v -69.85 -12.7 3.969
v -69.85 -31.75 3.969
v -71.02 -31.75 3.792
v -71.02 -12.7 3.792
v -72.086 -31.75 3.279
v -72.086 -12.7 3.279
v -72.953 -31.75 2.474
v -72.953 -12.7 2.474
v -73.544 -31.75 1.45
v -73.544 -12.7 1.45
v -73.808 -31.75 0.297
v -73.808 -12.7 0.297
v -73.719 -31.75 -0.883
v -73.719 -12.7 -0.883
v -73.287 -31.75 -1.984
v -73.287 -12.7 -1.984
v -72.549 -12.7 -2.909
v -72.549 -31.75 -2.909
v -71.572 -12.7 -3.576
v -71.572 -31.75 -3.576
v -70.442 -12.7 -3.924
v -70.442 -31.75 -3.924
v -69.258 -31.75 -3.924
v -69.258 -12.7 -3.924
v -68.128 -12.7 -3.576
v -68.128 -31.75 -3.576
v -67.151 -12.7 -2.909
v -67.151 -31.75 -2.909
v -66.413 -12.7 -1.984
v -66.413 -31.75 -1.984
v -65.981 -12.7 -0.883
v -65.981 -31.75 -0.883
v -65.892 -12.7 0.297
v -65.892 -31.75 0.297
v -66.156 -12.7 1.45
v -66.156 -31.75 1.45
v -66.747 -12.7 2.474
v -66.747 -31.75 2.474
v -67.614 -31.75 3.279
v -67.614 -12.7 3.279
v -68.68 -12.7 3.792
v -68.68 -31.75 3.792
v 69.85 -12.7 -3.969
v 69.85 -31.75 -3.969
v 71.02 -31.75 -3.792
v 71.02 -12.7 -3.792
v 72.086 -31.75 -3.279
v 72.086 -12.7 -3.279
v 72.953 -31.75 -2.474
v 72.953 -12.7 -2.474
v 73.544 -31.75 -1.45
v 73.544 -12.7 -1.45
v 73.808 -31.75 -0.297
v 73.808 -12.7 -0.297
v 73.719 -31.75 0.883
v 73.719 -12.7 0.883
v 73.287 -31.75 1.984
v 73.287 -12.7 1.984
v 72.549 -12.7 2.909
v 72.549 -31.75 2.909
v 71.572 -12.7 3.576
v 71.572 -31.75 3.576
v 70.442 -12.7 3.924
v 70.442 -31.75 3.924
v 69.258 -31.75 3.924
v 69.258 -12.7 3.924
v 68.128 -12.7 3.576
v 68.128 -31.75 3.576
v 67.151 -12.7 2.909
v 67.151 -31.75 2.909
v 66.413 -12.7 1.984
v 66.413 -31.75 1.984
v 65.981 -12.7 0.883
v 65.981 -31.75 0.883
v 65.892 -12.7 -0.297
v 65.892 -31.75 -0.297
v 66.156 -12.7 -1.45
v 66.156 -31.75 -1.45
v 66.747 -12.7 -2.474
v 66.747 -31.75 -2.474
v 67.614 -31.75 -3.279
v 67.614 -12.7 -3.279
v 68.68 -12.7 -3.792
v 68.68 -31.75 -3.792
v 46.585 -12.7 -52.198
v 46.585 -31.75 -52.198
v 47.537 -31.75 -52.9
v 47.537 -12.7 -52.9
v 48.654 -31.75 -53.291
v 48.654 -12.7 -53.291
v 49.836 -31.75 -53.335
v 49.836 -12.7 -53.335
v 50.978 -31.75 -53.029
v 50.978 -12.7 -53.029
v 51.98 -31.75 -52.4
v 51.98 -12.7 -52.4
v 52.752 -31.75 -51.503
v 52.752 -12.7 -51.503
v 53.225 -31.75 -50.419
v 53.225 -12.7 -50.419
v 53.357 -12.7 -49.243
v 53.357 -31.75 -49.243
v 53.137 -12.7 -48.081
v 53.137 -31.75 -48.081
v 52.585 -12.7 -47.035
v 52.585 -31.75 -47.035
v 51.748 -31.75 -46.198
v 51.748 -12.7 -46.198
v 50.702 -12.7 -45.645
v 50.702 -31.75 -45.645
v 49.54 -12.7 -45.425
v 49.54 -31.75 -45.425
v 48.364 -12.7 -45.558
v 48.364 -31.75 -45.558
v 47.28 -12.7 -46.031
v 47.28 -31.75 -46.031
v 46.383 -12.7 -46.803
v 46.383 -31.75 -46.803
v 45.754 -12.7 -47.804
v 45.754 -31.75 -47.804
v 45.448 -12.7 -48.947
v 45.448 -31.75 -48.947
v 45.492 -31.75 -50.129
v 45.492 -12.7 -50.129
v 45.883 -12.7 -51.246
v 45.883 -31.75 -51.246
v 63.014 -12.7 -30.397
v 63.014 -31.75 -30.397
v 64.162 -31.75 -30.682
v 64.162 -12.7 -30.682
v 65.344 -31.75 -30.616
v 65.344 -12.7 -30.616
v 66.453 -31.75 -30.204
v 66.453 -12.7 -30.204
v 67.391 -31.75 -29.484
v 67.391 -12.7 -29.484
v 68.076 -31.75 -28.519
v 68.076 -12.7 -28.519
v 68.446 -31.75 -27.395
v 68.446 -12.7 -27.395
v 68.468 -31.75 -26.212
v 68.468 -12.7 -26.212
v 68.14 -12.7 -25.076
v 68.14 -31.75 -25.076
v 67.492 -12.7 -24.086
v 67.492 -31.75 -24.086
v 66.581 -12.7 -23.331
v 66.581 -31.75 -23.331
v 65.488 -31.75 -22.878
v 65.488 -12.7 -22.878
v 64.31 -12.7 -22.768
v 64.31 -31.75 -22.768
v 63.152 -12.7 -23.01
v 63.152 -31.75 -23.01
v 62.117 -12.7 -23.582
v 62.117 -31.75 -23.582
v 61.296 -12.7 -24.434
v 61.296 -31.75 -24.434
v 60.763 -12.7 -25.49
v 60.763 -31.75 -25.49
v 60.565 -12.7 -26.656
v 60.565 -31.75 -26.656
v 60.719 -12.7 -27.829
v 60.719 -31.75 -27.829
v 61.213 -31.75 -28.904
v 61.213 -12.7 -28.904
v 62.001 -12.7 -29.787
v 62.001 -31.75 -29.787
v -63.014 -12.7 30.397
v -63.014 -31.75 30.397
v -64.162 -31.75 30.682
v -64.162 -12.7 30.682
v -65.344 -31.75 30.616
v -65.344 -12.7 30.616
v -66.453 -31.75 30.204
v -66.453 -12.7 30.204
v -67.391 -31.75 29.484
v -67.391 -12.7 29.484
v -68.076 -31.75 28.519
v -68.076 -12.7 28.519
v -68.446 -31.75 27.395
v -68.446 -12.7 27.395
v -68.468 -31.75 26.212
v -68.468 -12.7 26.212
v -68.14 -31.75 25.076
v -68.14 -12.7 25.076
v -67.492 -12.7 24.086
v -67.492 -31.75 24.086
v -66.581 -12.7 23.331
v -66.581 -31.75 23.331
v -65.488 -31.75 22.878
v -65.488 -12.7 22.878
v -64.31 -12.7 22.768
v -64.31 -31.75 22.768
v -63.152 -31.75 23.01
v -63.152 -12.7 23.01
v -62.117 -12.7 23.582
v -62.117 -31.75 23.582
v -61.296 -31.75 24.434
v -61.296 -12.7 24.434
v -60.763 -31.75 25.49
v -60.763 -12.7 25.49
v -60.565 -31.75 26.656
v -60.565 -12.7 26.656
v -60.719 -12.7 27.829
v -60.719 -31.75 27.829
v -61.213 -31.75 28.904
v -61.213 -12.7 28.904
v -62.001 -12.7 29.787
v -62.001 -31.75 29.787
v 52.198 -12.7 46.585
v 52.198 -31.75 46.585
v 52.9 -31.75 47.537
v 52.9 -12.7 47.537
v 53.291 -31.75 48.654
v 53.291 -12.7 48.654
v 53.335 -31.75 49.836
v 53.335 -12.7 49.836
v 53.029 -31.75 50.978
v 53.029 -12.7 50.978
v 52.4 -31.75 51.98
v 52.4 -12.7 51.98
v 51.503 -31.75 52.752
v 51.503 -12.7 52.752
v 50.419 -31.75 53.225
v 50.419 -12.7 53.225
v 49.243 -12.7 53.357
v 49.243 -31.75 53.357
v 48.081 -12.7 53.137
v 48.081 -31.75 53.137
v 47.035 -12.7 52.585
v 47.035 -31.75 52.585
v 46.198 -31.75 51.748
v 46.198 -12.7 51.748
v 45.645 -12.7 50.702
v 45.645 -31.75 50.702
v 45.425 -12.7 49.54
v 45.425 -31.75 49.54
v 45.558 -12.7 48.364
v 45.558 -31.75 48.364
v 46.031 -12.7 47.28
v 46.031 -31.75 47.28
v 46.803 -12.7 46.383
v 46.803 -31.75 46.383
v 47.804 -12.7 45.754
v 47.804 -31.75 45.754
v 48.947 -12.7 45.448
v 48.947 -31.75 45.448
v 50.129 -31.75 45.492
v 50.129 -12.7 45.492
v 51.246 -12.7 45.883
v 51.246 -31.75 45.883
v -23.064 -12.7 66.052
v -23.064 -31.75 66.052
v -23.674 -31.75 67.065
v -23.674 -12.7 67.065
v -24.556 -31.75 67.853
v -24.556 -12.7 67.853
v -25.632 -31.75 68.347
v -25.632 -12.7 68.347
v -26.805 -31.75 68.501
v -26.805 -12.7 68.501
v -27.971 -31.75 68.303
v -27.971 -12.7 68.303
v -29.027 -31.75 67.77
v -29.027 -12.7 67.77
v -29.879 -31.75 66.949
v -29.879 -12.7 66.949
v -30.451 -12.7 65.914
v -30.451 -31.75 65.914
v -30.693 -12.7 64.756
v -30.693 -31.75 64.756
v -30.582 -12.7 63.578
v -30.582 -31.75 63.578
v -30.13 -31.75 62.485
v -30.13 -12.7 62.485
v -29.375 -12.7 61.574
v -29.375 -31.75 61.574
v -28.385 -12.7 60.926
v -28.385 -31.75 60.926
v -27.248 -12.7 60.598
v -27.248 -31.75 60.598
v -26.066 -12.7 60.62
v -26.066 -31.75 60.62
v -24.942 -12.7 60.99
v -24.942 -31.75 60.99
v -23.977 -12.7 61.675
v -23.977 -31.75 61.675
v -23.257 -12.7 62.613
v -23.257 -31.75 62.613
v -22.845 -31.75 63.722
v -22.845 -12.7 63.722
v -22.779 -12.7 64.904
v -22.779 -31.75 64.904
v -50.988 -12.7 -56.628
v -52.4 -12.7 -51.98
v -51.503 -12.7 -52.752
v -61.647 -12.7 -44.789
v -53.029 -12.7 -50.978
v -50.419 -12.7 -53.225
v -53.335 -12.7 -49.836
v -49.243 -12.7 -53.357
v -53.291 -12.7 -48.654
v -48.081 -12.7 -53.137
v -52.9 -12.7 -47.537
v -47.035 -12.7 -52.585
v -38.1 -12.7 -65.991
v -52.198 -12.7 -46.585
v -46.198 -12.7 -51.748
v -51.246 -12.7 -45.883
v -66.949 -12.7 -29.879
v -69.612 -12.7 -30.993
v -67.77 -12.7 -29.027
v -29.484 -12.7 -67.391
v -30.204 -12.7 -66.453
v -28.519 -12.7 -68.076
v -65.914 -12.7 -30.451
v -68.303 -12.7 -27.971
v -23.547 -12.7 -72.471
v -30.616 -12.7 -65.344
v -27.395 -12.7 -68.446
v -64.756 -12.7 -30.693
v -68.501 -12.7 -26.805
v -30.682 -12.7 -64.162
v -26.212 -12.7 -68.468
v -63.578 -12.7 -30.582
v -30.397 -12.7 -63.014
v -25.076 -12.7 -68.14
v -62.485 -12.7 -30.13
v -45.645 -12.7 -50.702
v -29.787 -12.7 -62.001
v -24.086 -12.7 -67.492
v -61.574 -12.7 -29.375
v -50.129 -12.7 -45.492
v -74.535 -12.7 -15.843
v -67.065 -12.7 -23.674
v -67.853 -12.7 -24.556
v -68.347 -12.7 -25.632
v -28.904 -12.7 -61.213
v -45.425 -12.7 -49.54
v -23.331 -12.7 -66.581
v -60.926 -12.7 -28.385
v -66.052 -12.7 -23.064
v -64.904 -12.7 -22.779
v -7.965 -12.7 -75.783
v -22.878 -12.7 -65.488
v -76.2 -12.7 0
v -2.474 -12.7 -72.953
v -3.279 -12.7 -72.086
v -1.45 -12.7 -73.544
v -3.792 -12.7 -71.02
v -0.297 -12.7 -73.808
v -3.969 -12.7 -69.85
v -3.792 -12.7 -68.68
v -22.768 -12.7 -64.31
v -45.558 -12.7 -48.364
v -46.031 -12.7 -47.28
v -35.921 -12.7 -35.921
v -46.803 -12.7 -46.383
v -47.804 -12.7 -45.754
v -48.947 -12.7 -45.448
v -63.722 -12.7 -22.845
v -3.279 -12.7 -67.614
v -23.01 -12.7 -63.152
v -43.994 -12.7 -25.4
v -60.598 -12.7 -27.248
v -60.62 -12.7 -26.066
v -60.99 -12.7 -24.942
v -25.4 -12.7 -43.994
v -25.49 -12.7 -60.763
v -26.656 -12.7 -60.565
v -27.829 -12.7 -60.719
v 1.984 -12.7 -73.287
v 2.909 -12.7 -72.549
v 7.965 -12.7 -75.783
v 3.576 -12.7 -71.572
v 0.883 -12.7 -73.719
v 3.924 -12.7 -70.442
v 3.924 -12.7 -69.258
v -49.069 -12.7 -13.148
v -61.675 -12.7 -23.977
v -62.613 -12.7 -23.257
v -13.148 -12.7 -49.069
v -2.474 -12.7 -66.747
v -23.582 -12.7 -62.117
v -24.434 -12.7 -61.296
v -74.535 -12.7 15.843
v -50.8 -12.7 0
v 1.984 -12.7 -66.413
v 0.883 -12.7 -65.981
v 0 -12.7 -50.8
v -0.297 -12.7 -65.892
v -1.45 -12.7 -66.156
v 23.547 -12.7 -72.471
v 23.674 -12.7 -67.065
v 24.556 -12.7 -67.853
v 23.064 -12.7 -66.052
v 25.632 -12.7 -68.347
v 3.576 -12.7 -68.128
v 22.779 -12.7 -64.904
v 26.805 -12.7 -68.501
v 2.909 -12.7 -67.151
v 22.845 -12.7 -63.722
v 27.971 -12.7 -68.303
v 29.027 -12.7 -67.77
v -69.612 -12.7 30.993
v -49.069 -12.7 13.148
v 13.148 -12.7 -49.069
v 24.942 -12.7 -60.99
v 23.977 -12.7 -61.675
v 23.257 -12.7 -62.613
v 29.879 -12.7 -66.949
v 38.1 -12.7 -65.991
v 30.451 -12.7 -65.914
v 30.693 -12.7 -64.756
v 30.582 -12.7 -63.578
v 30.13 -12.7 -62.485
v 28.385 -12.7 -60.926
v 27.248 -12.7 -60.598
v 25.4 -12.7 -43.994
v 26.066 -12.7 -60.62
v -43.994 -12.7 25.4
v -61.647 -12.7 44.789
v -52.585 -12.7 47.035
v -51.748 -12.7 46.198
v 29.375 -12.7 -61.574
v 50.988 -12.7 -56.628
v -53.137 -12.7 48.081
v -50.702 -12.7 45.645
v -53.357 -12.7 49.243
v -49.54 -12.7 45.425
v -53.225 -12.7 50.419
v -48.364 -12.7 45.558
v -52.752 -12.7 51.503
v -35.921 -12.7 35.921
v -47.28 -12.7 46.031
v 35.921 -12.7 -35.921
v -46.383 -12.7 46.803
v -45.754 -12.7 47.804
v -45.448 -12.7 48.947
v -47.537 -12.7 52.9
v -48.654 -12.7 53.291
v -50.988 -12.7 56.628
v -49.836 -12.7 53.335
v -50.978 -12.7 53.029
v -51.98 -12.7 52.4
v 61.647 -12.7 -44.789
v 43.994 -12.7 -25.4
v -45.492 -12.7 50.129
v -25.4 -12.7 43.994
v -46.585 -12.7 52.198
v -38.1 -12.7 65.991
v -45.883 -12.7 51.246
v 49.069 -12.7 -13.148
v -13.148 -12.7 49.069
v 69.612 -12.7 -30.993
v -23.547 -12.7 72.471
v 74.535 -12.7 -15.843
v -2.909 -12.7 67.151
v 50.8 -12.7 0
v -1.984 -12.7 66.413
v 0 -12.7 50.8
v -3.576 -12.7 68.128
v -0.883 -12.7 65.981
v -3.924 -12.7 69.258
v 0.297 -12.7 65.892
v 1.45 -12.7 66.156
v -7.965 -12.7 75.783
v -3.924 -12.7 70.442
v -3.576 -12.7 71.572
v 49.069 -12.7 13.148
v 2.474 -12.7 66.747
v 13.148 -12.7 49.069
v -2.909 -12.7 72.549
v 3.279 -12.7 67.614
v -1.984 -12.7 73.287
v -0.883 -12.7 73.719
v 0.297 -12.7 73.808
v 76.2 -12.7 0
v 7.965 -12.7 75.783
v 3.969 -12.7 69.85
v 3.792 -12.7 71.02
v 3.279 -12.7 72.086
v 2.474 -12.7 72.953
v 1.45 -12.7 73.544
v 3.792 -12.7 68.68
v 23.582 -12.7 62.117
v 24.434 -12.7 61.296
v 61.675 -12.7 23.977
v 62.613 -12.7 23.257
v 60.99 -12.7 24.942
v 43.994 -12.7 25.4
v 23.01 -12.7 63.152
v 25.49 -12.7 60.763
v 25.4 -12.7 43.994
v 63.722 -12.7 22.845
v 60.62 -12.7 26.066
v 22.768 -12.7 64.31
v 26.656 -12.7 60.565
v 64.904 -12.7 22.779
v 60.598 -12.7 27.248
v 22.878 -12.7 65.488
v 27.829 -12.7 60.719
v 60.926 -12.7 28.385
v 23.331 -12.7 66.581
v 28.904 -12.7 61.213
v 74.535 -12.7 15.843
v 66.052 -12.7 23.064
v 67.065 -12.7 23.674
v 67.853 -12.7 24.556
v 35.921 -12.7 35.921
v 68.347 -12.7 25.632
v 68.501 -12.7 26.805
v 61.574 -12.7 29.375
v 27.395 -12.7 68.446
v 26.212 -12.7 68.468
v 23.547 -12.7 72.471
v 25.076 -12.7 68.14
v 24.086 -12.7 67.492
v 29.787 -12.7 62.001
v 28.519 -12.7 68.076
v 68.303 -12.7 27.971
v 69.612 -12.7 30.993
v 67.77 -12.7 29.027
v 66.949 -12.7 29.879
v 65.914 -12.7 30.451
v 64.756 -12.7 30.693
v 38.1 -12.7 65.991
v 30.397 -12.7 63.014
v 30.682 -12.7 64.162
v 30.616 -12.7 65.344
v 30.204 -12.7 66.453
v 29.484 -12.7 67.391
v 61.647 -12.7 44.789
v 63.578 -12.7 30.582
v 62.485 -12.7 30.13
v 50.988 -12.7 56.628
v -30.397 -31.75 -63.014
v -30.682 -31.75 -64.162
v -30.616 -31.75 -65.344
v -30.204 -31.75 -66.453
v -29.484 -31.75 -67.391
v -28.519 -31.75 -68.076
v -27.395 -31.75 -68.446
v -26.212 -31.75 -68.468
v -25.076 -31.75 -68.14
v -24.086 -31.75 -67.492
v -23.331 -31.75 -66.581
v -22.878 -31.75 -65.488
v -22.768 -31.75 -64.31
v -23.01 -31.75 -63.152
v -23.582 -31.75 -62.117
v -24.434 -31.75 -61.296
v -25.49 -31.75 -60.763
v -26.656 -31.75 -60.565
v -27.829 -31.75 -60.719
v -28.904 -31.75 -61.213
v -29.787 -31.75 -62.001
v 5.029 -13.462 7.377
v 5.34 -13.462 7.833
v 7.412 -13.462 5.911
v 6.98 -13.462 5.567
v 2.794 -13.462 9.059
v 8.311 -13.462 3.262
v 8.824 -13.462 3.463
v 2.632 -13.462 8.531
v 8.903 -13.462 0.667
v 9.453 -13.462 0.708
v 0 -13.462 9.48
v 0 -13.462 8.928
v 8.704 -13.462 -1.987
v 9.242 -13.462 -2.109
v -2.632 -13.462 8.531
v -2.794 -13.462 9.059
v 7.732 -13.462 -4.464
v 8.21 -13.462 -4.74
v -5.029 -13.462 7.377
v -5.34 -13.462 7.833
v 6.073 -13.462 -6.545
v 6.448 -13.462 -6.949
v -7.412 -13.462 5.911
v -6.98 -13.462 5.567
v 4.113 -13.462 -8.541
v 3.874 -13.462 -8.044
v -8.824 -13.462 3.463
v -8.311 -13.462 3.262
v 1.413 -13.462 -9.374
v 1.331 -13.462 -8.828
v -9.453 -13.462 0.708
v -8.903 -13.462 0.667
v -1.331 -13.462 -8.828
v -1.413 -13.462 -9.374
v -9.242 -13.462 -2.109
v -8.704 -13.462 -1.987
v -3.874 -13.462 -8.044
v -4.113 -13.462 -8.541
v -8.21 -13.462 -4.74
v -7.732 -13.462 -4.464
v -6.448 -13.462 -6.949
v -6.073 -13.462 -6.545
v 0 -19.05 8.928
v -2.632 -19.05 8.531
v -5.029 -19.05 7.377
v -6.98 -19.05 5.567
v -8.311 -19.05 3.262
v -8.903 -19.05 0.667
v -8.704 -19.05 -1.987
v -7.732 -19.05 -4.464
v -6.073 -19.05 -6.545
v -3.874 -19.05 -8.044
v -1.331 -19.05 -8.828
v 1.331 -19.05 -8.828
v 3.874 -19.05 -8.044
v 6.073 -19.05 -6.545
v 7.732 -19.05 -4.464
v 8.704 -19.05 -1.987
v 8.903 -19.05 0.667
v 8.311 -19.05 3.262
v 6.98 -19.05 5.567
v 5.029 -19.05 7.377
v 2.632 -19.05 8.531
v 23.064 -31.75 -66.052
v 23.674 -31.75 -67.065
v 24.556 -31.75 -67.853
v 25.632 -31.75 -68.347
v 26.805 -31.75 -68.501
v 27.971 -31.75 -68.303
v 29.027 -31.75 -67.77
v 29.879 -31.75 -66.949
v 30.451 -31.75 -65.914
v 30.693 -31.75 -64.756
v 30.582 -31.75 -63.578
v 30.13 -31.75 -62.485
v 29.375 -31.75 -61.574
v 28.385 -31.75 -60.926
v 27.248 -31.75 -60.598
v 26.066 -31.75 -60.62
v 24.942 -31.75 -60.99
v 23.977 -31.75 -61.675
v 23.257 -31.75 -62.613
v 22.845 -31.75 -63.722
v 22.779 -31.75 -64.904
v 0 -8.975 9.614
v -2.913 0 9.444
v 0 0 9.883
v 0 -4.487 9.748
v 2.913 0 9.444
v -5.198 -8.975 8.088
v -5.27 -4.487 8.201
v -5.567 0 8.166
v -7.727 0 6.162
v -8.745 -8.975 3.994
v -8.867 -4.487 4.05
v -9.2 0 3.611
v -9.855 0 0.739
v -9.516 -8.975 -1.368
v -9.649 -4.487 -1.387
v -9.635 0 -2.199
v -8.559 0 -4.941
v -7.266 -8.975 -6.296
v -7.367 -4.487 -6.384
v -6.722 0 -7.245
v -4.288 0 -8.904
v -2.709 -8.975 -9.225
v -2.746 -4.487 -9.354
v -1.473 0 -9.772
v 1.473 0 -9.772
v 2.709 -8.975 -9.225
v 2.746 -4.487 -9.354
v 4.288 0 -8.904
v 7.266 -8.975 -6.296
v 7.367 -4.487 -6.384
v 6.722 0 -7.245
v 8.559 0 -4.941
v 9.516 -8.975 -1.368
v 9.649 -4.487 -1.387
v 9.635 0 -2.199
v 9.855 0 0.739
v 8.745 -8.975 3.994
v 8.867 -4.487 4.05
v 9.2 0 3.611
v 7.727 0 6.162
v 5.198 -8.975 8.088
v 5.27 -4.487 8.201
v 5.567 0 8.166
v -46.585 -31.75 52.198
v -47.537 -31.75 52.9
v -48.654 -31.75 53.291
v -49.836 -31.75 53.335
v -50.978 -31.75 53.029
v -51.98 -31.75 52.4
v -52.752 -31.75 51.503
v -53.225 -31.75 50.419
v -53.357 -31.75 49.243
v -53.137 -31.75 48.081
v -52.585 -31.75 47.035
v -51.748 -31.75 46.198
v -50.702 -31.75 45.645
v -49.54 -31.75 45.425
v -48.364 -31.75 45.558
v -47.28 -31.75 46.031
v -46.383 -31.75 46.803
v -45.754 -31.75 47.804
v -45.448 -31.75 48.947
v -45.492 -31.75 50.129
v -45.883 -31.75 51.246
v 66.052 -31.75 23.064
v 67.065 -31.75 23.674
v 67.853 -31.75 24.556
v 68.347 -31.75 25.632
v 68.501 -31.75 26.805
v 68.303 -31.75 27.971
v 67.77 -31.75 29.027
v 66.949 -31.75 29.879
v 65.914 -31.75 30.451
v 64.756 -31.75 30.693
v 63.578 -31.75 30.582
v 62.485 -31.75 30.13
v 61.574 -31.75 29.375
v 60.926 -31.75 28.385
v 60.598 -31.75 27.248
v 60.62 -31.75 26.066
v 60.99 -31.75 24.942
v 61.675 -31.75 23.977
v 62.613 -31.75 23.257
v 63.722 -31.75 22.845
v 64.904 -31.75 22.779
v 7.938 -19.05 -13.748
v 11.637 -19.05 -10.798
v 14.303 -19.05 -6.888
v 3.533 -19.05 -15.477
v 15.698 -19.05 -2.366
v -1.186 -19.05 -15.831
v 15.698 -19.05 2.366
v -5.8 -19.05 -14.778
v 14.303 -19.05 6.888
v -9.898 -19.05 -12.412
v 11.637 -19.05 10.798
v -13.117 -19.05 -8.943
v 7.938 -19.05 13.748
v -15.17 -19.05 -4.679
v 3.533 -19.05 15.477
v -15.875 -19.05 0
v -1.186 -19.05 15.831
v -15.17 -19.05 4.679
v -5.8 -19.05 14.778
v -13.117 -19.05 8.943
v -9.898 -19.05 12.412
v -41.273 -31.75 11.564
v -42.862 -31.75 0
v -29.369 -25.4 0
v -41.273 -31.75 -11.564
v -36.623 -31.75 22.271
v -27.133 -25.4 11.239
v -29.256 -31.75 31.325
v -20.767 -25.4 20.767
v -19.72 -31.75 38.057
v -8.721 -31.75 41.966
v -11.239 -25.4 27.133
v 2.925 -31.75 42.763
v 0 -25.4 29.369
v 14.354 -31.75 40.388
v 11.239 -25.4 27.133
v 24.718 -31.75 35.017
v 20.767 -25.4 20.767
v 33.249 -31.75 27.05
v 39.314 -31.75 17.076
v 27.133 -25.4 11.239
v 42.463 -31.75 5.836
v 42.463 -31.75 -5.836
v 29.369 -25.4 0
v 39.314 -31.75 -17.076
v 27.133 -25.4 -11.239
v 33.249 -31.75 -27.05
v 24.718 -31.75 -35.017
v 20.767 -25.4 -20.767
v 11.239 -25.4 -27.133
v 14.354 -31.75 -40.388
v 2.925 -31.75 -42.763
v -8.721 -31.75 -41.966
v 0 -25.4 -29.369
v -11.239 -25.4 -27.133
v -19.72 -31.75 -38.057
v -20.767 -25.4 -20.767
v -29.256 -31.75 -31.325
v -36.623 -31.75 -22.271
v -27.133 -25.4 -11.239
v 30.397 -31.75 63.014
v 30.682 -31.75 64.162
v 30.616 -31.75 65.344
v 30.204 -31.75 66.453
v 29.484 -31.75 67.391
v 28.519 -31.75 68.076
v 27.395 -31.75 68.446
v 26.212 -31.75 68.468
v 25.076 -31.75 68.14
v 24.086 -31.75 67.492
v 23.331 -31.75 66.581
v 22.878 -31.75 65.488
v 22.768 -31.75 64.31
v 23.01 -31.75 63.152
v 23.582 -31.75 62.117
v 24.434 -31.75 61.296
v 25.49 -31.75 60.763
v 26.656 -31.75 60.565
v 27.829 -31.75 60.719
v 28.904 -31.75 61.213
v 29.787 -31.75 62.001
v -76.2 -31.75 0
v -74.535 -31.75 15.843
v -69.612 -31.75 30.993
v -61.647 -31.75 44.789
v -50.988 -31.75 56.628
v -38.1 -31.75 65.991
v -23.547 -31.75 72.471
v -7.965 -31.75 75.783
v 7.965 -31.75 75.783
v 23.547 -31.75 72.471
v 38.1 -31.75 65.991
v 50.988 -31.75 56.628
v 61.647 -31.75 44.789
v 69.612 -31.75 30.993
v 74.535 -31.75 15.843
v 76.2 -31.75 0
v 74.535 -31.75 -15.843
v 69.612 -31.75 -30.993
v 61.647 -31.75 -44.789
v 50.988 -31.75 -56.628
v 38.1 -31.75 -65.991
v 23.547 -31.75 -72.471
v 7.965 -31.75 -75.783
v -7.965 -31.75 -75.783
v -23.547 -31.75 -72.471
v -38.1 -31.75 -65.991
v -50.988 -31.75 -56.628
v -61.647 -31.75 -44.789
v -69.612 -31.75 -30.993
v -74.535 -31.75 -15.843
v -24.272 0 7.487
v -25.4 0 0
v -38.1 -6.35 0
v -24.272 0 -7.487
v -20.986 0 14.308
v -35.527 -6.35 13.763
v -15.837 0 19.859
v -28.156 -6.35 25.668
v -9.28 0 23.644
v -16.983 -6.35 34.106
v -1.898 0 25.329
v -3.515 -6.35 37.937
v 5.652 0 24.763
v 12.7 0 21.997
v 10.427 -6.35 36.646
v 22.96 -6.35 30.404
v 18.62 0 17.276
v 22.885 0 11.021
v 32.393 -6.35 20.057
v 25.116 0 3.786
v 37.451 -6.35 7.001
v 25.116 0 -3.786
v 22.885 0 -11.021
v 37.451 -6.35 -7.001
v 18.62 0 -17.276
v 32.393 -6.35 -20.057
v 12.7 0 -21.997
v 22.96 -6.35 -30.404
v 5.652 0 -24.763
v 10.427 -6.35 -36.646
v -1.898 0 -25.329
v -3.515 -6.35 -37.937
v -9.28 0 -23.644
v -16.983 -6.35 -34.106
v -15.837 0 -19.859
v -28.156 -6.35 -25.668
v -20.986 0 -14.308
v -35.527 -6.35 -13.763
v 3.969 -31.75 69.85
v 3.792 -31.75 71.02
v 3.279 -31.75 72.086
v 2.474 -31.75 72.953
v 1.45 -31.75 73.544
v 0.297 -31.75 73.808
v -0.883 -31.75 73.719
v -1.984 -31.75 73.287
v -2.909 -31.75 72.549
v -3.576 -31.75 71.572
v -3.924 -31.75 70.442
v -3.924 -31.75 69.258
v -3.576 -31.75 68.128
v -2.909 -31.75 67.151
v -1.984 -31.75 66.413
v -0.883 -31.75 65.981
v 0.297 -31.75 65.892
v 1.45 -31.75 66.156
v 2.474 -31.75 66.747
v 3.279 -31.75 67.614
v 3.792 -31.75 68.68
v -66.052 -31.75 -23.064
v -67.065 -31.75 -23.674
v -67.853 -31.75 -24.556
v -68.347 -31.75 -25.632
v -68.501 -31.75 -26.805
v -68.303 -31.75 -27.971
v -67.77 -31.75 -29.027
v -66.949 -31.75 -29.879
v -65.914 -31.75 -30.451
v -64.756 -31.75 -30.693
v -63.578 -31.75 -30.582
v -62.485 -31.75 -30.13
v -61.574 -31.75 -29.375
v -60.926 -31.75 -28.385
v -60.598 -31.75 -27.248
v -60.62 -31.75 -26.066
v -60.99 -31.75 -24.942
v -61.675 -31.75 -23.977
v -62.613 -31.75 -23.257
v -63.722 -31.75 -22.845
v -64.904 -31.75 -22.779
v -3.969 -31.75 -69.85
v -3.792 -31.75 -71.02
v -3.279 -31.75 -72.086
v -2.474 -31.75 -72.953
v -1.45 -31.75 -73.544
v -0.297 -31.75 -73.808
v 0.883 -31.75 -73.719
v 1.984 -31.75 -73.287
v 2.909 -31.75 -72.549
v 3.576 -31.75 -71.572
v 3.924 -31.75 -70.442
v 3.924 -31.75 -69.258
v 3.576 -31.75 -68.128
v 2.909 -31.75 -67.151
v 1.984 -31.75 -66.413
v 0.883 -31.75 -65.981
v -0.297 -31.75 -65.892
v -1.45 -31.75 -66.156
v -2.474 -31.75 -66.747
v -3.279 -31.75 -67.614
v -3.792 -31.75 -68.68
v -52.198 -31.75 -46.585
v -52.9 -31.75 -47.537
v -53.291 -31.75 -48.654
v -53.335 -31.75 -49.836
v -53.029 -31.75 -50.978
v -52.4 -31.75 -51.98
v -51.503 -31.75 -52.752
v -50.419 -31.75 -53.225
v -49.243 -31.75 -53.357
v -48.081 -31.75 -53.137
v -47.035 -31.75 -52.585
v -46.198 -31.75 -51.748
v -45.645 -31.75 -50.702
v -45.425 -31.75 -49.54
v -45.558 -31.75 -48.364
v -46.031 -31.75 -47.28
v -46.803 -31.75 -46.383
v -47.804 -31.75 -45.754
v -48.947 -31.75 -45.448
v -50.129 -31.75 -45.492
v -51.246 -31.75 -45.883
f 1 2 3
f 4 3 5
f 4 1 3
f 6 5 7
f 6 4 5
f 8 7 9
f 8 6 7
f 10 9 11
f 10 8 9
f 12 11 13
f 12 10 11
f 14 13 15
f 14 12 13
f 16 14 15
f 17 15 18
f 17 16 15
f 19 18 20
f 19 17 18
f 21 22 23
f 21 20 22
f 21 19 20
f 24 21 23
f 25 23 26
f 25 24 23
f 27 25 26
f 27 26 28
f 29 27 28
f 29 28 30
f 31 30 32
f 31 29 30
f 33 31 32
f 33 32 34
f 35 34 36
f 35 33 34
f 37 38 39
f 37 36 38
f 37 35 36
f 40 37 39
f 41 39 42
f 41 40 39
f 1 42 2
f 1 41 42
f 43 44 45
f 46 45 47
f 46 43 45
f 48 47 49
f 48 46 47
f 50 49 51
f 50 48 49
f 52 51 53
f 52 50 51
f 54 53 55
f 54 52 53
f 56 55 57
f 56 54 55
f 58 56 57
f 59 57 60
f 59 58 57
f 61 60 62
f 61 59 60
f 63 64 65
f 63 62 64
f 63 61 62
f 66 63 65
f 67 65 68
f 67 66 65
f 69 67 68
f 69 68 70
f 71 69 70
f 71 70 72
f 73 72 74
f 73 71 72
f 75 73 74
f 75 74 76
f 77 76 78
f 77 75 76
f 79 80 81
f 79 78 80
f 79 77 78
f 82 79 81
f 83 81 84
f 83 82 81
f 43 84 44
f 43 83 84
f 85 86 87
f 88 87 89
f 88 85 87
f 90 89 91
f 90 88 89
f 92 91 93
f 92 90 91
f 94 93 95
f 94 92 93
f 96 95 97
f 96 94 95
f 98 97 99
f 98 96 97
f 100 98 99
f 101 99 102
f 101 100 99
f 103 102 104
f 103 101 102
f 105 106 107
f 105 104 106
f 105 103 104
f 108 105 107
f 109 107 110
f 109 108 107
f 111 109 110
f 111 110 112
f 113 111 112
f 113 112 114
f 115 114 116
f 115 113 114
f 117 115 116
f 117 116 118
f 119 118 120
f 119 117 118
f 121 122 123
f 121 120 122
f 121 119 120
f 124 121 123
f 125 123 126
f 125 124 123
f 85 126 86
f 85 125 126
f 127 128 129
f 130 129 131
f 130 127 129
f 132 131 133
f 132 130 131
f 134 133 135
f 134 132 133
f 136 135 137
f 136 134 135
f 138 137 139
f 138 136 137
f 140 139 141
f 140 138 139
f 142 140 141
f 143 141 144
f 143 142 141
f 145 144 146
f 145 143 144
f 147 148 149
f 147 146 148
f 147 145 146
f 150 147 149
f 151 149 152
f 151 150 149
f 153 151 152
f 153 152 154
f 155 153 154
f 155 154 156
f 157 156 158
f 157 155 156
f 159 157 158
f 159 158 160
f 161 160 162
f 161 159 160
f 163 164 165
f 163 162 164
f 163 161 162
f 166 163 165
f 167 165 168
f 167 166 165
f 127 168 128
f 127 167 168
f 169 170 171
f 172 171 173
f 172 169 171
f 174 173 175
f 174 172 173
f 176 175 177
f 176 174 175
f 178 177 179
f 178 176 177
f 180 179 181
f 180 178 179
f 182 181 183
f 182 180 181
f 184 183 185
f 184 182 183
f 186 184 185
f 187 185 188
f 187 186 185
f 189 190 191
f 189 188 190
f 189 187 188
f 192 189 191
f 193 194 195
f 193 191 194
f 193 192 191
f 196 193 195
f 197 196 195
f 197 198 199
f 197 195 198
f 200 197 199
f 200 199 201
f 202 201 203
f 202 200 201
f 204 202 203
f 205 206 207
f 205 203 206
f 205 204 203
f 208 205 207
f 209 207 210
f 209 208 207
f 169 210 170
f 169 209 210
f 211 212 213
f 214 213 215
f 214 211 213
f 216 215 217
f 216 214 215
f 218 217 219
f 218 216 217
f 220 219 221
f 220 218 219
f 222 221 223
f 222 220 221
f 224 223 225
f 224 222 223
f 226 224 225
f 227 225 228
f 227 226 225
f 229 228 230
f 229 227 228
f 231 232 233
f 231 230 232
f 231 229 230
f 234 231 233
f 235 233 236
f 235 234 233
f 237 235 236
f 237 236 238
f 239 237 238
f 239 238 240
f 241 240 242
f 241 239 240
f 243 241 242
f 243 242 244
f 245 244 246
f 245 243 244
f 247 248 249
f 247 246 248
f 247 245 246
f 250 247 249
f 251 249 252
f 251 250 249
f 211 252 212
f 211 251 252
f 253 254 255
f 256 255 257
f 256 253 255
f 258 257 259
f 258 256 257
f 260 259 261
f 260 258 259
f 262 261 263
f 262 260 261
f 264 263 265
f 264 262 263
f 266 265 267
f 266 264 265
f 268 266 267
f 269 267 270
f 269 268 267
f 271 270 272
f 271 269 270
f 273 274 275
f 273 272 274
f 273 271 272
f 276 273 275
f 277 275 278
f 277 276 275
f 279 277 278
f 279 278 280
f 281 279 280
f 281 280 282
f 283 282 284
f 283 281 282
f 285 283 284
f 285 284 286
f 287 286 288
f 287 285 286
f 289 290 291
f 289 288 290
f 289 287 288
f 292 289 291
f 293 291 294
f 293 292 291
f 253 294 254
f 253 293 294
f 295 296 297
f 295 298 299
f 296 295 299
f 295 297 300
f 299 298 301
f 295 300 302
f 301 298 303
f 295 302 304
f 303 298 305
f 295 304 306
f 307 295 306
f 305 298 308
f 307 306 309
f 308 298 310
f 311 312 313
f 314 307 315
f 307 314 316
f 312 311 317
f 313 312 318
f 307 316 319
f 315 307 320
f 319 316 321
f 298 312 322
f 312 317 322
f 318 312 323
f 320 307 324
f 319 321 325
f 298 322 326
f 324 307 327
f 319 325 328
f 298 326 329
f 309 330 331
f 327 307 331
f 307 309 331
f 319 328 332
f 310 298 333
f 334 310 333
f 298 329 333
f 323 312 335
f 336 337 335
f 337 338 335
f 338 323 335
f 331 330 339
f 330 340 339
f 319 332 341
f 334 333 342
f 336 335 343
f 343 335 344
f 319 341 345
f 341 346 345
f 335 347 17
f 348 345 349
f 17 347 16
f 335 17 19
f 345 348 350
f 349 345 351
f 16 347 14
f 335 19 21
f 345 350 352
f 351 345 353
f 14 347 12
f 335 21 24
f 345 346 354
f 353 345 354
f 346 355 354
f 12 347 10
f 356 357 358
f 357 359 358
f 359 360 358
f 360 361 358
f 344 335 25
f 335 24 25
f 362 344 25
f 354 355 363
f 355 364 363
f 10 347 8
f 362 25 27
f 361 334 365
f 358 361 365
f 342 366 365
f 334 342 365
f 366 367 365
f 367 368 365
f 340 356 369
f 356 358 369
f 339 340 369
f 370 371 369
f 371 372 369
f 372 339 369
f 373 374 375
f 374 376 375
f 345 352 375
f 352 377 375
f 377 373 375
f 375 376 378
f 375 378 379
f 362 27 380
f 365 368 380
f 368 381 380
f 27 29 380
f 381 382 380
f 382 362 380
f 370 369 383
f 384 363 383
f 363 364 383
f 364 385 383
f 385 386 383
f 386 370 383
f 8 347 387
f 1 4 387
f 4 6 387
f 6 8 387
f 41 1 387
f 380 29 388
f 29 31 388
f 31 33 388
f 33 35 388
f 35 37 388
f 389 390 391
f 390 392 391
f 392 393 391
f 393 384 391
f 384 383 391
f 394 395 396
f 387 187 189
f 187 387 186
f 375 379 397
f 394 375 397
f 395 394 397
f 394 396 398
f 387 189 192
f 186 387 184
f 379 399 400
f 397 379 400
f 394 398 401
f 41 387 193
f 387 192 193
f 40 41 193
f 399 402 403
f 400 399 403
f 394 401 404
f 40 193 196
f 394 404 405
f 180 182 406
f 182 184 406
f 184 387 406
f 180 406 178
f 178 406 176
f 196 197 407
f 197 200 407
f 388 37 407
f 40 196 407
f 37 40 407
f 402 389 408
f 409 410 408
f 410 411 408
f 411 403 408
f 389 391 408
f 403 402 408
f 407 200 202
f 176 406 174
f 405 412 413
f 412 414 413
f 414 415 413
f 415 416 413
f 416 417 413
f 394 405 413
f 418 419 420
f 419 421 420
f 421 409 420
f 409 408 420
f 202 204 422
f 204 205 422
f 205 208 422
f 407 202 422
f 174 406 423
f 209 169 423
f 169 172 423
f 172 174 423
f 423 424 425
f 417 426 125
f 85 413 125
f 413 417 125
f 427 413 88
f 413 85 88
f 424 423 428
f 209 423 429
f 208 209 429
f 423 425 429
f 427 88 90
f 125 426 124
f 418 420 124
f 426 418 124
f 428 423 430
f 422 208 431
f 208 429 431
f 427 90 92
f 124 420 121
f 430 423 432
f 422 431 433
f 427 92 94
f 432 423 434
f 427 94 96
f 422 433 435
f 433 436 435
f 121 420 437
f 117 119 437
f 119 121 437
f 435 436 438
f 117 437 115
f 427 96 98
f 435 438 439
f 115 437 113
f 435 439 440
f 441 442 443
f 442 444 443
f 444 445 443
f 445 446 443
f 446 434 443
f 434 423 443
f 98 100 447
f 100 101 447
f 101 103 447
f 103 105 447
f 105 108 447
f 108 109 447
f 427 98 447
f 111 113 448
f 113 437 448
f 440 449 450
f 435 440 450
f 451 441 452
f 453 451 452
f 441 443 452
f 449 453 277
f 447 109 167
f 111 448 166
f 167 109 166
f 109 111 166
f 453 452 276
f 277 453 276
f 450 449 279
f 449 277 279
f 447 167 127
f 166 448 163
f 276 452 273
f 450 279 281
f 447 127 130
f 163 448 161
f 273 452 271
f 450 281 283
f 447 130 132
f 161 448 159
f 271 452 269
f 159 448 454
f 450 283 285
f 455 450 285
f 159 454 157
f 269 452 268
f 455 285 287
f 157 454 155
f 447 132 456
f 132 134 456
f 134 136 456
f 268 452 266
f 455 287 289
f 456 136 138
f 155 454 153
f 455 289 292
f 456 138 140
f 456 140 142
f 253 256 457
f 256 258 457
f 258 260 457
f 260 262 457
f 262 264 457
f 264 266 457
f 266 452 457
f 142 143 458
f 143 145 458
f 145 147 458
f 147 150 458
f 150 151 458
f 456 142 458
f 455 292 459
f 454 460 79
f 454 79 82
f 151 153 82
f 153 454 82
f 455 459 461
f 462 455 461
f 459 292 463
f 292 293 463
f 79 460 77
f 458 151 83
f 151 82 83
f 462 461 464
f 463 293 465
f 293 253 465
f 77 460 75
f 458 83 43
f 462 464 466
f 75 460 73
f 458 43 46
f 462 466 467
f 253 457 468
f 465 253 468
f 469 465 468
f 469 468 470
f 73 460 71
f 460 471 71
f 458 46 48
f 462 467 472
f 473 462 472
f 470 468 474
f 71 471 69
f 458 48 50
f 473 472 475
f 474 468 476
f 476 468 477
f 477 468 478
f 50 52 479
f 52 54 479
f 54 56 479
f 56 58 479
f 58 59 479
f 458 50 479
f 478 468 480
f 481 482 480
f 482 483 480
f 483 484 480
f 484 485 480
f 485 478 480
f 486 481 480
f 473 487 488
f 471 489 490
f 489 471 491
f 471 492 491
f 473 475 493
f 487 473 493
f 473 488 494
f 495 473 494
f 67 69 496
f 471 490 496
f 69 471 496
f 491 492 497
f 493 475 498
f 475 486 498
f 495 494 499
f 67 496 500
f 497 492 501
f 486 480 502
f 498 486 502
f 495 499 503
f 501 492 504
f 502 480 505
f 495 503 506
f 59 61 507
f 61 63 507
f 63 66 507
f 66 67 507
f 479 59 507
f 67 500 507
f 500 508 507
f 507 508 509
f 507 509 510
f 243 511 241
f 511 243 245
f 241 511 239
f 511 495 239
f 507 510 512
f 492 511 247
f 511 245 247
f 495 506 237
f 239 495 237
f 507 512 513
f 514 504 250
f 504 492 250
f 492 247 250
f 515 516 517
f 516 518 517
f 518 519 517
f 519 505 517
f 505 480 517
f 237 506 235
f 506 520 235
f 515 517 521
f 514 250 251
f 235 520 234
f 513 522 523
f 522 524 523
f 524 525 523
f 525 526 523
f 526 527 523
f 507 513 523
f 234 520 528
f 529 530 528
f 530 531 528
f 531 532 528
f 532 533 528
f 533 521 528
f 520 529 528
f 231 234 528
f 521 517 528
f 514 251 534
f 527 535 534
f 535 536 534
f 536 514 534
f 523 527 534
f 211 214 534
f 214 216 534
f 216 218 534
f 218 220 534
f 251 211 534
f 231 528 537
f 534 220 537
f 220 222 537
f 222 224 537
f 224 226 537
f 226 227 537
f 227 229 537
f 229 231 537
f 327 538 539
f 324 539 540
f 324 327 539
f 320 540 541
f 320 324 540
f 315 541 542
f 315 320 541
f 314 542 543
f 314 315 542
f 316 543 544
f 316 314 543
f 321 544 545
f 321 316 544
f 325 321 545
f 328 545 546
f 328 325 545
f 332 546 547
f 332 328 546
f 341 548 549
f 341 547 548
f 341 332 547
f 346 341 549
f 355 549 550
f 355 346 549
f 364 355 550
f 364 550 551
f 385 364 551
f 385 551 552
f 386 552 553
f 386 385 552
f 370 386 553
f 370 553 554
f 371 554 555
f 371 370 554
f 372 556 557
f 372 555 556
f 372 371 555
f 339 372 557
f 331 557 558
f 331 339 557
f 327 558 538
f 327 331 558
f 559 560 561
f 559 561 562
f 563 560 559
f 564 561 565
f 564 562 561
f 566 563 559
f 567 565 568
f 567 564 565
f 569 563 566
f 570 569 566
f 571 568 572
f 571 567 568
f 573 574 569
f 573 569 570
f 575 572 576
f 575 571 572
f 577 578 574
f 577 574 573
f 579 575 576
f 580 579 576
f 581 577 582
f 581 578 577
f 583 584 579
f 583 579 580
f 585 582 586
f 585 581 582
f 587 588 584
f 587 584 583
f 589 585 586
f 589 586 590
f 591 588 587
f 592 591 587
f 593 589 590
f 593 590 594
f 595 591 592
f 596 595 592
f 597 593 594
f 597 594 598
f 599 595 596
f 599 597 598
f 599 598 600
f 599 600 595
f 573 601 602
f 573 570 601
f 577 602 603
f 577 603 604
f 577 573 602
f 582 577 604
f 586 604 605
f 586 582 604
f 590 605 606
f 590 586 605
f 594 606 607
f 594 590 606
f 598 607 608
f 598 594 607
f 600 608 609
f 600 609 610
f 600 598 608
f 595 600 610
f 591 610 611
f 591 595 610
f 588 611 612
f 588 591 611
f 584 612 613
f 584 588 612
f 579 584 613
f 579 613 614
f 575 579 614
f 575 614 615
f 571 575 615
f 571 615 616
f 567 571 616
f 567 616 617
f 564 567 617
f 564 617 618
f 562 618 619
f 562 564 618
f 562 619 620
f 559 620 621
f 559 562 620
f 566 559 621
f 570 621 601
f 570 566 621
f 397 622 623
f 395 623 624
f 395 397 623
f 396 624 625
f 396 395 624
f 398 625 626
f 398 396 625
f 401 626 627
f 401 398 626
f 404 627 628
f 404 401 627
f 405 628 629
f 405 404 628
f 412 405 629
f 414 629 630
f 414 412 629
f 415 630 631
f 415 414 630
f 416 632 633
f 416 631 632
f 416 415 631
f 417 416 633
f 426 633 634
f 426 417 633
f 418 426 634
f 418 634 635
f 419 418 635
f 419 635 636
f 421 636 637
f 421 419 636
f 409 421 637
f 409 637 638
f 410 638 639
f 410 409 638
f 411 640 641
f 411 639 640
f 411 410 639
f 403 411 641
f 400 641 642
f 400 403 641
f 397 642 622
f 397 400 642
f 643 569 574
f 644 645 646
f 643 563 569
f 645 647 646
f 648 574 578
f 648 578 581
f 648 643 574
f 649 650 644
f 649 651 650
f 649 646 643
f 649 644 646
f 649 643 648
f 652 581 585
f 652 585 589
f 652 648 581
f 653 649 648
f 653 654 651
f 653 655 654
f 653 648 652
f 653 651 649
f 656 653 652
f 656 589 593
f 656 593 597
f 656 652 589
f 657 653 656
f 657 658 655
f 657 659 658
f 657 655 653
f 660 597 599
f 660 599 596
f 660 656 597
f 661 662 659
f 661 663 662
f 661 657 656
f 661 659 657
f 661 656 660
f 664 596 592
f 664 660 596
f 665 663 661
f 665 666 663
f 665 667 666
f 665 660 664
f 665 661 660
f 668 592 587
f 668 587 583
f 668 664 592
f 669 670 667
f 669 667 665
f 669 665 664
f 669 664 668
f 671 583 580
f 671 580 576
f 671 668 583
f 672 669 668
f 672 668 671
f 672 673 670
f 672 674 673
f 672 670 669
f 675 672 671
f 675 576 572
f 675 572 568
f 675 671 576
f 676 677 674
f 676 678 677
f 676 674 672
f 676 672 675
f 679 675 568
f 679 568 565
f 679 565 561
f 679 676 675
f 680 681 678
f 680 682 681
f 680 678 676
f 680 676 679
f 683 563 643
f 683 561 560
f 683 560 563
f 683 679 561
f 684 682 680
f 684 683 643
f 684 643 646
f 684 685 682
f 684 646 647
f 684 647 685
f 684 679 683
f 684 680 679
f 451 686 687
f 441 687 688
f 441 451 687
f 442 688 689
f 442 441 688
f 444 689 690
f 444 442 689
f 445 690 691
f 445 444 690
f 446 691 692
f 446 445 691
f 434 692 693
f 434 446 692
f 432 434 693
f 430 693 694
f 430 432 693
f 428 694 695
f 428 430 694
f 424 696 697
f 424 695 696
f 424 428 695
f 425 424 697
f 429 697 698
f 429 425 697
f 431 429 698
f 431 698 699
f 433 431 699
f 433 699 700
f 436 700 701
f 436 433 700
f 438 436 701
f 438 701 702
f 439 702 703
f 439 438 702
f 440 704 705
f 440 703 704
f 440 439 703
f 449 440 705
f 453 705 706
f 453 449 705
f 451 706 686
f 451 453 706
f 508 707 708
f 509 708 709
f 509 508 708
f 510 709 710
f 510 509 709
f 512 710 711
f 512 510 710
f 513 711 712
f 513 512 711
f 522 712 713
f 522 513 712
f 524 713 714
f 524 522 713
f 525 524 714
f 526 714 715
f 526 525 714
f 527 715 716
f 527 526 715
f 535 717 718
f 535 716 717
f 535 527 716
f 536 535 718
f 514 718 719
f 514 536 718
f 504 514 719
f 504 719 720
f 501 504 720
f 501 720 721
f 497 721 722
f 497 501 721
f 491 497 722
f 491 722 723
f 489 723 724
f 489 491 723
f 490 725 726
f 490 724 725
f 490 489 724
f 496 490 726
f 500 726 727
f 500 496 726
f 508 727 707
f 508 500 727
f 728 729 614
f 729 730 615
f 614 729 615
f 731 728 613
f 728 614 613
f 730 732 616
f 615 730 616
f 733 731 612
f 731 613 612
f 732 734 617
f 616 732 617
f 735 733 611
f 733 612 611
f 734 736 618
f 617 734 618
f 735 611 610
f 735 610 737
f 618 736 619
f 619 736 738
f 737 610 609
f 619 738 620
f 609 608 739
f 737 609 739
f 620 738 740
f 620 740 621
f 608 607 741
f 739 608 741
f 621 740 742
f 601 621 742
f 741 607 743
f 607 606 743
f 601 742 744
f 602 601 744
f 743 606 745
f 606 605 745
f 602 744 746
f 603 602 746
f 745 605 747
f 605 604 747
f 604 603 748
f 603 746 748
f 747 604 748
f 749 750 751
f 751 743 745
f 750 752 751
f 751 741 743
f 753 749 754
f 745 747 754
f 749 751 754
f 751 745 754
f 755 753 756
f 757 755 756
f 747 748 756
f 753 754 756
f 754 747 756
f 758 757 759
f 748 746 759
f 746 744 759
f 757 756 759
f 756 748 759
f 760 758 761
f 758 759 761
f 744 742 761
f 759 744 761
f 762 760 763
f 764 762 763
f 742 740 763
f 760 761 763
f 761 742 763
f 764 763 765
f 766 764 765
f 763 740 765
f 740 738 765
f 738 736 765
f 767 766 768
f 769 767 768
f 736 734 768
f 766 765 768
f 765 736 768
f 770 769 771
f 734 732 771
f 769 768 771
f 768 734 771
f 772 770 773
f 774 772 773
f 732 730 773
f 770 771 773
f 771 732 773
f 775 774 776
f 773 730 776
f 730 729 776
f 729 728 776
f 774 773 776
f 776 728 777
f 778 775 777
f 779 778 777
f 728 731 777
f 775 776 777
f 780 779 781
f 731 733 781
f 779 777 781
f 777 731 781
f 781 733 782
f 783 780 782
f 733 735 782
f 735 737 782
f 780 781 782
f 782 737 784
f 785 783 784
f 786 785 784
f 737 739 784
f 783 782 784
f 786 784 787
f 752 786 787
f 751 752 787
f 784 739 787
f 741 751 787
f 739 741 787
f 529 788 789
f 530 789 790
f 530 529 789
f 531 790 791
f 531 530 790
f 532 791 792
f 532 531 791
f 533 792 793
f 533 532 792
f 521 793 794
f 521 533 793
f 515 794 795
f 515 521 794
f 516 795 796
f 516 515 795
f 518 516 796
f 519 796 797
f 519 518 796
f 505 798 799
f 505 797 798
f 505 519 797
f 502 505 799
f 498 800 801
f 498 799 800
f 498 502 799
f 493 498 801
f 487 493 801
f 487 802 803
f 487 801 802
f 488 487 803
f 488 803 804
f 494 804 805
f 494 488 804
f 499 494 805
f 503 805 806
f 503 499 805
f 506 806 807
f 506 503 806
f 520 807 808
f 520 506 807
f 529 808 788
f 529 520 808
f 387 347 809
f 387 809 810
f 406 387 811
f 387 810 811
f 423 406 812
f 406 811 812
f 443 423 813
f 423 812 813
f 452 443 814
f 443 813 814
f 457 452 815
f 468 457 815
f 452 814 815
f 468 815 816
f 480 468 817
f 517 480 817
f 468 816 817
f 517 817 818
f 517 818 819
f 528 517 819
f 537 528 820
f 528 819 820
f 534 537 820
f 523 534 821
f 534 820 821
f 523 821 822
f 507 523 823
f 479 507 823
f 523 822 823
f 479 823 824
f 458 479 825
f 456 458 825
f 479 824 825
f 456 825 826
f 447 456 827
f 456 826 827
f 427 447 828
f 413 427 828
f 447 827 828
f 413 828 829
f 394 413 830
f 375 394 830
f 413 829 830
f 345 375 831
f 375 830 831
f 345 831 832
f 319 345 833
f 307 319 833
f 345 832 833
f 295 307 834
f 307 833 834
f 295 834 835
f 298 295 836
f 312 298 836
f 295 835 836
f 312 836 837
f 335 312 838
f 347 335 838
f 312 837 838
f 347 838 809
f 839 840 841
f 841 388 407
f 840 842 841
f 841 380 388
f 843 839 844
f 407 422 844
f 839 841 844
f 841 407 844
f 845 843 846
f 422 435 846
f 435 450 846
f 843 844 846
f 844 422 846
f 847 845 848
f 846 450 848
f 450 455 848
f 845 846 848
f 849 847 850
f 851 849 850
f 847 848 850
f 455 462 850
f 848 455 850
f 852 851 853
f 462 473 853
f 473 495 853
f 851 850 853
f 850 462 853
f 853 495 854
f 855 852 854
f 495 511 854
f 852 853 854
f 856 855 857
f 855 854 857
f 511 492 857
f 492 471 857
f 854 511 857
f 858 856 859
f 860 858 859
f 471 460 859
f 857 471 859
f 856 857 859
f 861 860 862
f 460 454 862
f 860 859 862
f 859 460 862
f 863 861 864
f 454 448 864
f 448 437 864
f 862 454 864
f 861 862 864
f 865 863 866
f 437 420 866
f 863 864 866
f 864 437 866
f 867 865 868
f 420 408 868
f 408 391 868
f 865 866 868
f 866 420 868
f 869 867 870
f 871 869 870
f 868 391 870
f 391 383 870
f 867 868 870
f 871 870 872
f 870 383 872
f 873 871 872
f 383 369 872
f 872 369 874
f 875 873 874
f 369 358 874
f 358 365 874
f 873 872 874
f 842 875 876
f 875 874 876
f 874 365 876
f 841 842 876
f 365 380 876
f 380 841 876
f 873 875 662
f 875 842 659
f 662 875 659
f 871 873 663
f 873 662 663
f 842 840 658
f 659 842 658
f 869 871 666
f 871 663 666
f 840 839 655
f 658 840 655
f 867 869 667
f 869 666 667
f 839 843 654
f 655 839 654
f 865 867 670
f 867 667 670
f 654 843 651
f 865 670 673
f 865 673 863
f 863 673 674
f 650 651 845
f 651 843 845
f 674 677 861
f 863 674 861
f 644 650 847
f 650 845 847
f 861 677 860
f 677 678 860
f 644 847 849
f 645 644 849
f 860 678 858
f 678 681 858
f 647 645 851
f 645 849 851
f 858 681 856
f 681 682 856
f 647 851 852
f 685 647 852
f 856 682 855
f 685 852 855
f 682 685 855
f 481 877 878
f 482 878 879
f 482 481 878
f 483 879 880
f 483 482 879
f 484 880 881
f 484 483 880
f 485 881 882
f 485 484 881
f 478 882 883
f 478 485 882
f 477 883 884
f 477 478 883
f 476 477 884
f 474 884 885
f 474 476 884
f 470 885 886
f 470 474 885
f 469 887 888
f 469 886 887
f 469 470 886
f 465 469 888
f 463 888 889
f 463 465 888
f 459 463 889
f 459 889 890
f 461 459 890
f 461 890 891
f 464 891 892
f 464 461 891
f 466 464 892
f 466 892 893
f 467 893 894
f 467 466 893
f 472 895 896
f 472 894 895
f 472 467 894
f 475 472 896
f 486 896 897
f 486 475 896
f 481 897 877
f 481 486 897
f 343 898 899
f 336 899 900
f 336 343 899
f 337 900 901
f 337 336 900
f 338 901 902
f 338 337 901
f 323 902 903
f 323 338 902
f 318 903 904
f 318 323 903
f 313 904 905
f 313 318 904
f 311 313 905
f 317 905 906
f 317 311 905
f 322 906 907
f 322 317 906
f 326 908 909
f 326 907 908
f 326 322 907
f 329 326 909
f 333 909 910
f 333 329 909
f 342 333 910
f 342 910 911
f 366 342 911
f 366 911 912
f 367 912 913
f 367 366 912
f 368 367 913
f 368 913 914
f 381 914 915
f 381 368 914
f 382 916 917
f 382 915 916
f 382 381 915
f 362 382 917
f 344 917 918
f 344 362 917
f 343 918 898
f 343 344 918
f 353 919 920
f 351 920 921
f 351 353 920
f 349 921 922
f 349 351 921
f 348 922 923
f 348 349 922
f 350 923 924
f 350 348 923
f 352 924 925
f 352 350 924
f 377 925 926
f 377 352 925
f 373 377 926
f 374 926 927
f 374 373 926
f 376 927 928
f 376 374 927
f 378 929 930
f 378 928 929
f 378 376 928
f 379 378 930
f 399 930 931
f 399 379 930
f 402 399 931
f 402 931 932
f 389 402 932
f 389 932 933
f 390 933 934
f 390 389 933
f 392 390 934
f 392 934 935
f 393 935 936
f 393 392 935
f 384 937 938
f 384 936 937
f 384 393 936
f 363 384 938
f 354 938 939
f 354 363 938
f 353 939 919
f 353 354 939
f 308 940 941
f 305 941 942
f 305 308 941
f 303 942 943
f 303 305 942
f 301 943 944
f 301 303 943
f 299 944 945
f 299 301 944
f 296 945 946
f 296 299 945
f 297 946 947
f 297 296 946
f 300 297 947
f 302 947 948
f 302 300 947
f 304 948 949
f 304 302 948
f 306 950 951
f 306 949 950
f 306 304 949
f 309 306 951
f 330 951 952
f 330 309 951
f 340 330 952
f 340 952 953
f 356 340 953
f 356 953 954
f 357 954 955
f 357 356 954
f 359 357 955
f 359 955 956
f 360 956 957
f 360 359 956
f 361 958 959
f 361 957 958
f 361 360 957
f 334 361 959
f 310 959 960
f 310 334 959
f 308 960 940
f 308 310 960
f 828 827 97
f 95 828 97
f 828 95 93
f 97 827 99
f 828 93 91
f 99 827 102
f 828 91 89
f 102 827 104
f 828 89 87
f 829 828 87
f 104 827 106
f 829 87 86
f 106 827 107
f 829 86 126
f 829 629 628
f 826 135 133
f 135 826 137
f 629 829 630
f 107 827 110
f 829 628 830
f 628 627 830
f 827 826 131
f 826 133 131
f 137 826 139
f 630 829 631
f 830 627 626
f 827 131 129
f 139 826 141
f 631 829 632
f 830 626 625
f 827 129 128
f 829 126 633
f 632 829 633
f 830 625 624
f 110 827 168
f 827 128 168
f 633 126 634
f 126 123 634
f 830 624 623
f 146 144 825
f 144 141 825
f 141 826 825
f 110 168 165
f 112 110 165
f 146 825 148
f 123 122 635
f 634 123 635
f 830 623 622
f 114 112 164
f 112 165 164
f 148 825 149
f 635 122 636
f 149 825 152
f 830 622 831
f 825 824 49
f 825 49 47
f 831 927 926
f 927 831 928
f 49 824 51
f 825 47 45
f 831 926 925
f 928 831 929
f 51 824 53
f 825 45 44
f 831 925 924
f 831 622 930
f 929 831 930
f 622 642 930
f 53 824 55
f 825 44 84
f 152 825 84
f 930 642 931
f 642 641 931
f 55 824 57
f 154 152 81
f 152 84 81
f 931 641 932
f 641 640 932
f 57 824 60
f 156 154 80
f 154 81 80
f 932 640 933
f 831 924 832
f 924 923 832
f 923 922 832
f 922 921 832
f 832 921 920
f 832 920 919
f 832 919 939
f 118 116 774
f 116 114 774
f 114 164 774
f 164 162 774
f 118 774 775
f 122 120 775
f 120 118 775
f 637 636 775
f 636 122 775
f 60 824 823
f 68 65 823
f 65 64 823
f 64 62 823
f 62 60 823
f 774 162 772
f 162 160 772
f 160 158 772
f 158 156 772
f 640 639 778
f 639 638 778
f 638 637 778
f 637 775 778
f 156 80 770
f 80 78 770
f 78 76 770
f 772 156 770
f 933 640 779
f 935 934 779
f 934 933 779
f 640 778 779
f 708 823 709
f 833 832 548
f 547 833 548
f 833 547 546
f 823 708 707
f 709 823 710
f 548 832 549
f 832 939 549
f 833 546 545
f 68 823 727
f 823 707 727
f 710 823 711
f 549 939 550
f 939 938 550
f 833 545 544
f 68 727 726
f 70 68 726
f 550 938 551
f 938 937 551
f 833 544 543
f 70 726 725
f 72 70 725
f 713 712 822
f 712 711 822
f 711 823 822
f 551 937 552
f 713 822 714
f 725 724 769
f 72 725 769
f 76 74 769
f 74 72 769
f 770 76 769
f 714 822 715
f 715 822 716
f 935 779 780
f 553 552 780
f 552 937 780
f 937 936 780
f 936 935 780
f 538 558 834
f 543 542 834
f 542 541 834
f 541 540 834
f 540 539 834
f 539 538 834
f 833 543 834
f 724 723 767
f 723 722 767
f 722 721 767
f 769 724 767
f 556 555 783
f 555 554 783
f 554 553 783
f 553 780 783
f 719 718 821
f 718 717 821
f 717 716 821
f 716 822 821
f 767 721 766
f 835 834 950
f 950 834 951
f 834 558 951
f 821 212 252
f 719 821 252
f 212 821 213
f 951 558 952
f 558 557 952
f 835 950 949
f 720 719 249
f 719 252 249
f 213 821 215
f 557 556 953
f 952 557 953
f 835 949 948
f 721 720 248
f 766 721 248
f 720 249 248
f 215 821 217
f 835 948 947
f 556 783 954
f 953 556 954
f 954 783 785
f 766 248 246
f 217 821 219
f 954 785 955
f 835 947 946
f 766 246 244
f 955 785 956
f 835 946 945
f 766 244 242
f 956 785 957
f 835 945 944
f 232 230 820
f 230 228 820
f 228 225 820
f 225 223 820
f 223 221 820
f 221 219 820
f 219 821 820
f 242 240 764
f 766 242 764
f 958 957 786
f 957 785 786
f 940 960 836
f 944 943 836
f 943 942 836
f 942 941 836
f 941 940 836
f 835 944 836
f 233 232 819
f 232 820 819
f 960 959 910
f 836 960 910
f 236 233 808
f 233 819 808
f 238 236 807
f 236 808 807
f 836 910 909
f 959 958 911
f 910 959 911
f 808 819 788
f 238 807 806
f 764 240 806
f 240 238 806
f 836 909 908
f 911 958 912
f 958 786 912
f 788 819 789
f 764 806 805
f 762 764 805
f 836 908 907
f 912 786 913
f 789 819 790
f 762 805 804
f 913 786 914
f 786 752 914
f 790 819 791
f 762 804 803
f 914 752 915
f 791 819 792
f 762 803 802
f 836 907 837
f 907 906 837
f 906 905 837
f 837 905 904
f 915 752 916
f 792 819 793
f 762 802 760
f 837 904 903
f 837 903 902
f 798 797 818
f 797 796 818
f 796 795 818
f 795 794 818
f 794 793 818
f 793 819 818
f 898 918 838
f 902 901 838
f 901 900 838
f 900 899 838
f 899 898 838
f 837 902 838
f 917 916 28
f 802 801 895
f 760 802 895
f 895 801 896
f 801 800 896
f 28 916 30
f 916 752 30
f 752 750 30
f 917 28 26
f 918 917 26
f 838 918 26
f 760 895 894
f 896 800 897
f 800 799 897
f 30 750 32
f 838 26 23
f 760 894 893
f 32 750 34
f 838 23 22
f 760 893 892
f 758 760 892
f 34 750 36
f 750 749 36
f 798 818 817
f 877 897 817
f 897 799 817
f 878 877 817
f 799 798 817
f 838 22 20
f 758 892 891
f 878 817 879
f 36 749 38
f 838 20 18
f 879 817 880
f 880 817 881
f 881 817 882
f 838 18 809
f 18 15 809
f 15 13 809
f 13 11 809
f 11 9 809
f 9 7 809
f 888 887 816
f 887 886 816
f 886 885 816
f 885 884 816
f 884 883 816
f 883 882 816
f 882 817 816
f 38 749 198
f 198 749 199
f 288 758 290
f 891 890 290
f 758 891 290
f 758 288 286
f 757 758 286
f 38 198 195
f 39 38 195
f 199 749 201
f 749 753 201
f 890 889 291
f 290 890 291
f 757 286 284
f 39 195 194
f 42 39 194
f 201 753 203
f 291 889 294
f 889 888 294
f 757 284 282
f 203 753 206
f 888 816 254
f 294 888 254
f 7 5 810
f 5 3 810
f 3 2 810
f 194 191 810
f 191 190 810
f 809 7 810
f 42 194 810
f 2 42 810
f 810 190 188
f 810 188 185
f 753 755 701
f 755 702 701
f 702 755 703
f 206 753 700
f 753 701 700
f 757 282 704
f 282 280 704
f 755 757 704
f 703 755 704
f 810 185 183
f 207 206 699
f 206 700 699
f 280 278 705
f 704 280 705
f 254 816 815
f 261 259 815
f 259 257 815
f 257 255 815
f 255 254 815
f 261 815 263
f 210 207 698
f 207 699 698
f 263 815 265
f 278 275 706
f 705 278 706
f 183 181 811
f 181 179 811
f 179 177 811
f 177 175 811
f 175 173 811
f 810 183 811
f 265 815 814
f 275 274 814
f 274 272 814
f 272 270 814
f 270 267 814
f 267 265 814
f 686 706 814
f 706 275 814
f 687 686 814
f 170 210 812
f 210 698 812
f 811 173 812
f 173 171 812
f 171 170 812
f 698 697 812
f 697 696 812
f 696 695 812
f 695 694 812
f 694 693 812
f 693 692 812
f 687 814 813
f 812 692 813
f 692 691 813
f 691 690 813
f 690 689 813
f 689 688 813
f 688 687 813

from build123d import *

# Parameters (mm, degrees)
CIRPATTERN1_COUNT = 16


with BuildPart() as part:
    # Sketch1 → Revolve1 (revolve)
    with BuildSketch(Plane.XY):
        Polygon((-76.2, -12.7), (-76.2, -31.75), (-42.8625, -31.75), (-15.875, -19.05), (0, -19.05), (0, 0), (-25.4, 0), (-50.8, -12.7), align=None)
    revolve(axis=Axis((0, -19.05, 0), (0, 1, 0)))

    # Sketch5 → 5/16 (0.3125) Diameter Hole1 (revolve, cut)
    with BuildSketch(Plane(origin=(-69.85, -12.7, 0), x_dir=(0, 0, 1), z_dir=(1, 0, 0))):
        Polygon((0, 0), (0, 40.484665582), (3.96875, 38.1), (3.96875, 0), align=None)
    f_5_16_0_3125_diameter_hole1 = revolve(axis=Axis((-69.85, -6.35, 0), (0, -1, 0)), mode=Mode.SUBTRACT)

    # CirPattern1: 5/16 (0.3125) Diameter Hole1 ×16 about axis
    cirpattern1_axis = Axis((0, 0, 0), (0, 1, 0))
    for i in range(1, CIRPATTERN1_COUNT):
        add(f_5_16_0_3125_diameter_hole1.rotate(cirpattern1_axis, i * 360 / CIRPATTERN1_COUNT), mode=Mode.SUBTRACT)

    # Sketch8 → 1/2 NPT Tapped Hole1 (revolve, cut)
    with BuildSketch(Plane(origin=(0, 0, 0), x_dir=(0, 0, 1), z_dir=(1, 0, 0))):
        Polygon((0, 0), (0, 19.05), (8.9281, 19.05), (8.9281, 13.462), (9.479726792, 13.462), (9.8827971, 0), align=None)
    revolve(axis=Axis((0, 6.35, 0), (0, -1, 0)), mode=Mode.SUBTRACT)


solid = part.part
